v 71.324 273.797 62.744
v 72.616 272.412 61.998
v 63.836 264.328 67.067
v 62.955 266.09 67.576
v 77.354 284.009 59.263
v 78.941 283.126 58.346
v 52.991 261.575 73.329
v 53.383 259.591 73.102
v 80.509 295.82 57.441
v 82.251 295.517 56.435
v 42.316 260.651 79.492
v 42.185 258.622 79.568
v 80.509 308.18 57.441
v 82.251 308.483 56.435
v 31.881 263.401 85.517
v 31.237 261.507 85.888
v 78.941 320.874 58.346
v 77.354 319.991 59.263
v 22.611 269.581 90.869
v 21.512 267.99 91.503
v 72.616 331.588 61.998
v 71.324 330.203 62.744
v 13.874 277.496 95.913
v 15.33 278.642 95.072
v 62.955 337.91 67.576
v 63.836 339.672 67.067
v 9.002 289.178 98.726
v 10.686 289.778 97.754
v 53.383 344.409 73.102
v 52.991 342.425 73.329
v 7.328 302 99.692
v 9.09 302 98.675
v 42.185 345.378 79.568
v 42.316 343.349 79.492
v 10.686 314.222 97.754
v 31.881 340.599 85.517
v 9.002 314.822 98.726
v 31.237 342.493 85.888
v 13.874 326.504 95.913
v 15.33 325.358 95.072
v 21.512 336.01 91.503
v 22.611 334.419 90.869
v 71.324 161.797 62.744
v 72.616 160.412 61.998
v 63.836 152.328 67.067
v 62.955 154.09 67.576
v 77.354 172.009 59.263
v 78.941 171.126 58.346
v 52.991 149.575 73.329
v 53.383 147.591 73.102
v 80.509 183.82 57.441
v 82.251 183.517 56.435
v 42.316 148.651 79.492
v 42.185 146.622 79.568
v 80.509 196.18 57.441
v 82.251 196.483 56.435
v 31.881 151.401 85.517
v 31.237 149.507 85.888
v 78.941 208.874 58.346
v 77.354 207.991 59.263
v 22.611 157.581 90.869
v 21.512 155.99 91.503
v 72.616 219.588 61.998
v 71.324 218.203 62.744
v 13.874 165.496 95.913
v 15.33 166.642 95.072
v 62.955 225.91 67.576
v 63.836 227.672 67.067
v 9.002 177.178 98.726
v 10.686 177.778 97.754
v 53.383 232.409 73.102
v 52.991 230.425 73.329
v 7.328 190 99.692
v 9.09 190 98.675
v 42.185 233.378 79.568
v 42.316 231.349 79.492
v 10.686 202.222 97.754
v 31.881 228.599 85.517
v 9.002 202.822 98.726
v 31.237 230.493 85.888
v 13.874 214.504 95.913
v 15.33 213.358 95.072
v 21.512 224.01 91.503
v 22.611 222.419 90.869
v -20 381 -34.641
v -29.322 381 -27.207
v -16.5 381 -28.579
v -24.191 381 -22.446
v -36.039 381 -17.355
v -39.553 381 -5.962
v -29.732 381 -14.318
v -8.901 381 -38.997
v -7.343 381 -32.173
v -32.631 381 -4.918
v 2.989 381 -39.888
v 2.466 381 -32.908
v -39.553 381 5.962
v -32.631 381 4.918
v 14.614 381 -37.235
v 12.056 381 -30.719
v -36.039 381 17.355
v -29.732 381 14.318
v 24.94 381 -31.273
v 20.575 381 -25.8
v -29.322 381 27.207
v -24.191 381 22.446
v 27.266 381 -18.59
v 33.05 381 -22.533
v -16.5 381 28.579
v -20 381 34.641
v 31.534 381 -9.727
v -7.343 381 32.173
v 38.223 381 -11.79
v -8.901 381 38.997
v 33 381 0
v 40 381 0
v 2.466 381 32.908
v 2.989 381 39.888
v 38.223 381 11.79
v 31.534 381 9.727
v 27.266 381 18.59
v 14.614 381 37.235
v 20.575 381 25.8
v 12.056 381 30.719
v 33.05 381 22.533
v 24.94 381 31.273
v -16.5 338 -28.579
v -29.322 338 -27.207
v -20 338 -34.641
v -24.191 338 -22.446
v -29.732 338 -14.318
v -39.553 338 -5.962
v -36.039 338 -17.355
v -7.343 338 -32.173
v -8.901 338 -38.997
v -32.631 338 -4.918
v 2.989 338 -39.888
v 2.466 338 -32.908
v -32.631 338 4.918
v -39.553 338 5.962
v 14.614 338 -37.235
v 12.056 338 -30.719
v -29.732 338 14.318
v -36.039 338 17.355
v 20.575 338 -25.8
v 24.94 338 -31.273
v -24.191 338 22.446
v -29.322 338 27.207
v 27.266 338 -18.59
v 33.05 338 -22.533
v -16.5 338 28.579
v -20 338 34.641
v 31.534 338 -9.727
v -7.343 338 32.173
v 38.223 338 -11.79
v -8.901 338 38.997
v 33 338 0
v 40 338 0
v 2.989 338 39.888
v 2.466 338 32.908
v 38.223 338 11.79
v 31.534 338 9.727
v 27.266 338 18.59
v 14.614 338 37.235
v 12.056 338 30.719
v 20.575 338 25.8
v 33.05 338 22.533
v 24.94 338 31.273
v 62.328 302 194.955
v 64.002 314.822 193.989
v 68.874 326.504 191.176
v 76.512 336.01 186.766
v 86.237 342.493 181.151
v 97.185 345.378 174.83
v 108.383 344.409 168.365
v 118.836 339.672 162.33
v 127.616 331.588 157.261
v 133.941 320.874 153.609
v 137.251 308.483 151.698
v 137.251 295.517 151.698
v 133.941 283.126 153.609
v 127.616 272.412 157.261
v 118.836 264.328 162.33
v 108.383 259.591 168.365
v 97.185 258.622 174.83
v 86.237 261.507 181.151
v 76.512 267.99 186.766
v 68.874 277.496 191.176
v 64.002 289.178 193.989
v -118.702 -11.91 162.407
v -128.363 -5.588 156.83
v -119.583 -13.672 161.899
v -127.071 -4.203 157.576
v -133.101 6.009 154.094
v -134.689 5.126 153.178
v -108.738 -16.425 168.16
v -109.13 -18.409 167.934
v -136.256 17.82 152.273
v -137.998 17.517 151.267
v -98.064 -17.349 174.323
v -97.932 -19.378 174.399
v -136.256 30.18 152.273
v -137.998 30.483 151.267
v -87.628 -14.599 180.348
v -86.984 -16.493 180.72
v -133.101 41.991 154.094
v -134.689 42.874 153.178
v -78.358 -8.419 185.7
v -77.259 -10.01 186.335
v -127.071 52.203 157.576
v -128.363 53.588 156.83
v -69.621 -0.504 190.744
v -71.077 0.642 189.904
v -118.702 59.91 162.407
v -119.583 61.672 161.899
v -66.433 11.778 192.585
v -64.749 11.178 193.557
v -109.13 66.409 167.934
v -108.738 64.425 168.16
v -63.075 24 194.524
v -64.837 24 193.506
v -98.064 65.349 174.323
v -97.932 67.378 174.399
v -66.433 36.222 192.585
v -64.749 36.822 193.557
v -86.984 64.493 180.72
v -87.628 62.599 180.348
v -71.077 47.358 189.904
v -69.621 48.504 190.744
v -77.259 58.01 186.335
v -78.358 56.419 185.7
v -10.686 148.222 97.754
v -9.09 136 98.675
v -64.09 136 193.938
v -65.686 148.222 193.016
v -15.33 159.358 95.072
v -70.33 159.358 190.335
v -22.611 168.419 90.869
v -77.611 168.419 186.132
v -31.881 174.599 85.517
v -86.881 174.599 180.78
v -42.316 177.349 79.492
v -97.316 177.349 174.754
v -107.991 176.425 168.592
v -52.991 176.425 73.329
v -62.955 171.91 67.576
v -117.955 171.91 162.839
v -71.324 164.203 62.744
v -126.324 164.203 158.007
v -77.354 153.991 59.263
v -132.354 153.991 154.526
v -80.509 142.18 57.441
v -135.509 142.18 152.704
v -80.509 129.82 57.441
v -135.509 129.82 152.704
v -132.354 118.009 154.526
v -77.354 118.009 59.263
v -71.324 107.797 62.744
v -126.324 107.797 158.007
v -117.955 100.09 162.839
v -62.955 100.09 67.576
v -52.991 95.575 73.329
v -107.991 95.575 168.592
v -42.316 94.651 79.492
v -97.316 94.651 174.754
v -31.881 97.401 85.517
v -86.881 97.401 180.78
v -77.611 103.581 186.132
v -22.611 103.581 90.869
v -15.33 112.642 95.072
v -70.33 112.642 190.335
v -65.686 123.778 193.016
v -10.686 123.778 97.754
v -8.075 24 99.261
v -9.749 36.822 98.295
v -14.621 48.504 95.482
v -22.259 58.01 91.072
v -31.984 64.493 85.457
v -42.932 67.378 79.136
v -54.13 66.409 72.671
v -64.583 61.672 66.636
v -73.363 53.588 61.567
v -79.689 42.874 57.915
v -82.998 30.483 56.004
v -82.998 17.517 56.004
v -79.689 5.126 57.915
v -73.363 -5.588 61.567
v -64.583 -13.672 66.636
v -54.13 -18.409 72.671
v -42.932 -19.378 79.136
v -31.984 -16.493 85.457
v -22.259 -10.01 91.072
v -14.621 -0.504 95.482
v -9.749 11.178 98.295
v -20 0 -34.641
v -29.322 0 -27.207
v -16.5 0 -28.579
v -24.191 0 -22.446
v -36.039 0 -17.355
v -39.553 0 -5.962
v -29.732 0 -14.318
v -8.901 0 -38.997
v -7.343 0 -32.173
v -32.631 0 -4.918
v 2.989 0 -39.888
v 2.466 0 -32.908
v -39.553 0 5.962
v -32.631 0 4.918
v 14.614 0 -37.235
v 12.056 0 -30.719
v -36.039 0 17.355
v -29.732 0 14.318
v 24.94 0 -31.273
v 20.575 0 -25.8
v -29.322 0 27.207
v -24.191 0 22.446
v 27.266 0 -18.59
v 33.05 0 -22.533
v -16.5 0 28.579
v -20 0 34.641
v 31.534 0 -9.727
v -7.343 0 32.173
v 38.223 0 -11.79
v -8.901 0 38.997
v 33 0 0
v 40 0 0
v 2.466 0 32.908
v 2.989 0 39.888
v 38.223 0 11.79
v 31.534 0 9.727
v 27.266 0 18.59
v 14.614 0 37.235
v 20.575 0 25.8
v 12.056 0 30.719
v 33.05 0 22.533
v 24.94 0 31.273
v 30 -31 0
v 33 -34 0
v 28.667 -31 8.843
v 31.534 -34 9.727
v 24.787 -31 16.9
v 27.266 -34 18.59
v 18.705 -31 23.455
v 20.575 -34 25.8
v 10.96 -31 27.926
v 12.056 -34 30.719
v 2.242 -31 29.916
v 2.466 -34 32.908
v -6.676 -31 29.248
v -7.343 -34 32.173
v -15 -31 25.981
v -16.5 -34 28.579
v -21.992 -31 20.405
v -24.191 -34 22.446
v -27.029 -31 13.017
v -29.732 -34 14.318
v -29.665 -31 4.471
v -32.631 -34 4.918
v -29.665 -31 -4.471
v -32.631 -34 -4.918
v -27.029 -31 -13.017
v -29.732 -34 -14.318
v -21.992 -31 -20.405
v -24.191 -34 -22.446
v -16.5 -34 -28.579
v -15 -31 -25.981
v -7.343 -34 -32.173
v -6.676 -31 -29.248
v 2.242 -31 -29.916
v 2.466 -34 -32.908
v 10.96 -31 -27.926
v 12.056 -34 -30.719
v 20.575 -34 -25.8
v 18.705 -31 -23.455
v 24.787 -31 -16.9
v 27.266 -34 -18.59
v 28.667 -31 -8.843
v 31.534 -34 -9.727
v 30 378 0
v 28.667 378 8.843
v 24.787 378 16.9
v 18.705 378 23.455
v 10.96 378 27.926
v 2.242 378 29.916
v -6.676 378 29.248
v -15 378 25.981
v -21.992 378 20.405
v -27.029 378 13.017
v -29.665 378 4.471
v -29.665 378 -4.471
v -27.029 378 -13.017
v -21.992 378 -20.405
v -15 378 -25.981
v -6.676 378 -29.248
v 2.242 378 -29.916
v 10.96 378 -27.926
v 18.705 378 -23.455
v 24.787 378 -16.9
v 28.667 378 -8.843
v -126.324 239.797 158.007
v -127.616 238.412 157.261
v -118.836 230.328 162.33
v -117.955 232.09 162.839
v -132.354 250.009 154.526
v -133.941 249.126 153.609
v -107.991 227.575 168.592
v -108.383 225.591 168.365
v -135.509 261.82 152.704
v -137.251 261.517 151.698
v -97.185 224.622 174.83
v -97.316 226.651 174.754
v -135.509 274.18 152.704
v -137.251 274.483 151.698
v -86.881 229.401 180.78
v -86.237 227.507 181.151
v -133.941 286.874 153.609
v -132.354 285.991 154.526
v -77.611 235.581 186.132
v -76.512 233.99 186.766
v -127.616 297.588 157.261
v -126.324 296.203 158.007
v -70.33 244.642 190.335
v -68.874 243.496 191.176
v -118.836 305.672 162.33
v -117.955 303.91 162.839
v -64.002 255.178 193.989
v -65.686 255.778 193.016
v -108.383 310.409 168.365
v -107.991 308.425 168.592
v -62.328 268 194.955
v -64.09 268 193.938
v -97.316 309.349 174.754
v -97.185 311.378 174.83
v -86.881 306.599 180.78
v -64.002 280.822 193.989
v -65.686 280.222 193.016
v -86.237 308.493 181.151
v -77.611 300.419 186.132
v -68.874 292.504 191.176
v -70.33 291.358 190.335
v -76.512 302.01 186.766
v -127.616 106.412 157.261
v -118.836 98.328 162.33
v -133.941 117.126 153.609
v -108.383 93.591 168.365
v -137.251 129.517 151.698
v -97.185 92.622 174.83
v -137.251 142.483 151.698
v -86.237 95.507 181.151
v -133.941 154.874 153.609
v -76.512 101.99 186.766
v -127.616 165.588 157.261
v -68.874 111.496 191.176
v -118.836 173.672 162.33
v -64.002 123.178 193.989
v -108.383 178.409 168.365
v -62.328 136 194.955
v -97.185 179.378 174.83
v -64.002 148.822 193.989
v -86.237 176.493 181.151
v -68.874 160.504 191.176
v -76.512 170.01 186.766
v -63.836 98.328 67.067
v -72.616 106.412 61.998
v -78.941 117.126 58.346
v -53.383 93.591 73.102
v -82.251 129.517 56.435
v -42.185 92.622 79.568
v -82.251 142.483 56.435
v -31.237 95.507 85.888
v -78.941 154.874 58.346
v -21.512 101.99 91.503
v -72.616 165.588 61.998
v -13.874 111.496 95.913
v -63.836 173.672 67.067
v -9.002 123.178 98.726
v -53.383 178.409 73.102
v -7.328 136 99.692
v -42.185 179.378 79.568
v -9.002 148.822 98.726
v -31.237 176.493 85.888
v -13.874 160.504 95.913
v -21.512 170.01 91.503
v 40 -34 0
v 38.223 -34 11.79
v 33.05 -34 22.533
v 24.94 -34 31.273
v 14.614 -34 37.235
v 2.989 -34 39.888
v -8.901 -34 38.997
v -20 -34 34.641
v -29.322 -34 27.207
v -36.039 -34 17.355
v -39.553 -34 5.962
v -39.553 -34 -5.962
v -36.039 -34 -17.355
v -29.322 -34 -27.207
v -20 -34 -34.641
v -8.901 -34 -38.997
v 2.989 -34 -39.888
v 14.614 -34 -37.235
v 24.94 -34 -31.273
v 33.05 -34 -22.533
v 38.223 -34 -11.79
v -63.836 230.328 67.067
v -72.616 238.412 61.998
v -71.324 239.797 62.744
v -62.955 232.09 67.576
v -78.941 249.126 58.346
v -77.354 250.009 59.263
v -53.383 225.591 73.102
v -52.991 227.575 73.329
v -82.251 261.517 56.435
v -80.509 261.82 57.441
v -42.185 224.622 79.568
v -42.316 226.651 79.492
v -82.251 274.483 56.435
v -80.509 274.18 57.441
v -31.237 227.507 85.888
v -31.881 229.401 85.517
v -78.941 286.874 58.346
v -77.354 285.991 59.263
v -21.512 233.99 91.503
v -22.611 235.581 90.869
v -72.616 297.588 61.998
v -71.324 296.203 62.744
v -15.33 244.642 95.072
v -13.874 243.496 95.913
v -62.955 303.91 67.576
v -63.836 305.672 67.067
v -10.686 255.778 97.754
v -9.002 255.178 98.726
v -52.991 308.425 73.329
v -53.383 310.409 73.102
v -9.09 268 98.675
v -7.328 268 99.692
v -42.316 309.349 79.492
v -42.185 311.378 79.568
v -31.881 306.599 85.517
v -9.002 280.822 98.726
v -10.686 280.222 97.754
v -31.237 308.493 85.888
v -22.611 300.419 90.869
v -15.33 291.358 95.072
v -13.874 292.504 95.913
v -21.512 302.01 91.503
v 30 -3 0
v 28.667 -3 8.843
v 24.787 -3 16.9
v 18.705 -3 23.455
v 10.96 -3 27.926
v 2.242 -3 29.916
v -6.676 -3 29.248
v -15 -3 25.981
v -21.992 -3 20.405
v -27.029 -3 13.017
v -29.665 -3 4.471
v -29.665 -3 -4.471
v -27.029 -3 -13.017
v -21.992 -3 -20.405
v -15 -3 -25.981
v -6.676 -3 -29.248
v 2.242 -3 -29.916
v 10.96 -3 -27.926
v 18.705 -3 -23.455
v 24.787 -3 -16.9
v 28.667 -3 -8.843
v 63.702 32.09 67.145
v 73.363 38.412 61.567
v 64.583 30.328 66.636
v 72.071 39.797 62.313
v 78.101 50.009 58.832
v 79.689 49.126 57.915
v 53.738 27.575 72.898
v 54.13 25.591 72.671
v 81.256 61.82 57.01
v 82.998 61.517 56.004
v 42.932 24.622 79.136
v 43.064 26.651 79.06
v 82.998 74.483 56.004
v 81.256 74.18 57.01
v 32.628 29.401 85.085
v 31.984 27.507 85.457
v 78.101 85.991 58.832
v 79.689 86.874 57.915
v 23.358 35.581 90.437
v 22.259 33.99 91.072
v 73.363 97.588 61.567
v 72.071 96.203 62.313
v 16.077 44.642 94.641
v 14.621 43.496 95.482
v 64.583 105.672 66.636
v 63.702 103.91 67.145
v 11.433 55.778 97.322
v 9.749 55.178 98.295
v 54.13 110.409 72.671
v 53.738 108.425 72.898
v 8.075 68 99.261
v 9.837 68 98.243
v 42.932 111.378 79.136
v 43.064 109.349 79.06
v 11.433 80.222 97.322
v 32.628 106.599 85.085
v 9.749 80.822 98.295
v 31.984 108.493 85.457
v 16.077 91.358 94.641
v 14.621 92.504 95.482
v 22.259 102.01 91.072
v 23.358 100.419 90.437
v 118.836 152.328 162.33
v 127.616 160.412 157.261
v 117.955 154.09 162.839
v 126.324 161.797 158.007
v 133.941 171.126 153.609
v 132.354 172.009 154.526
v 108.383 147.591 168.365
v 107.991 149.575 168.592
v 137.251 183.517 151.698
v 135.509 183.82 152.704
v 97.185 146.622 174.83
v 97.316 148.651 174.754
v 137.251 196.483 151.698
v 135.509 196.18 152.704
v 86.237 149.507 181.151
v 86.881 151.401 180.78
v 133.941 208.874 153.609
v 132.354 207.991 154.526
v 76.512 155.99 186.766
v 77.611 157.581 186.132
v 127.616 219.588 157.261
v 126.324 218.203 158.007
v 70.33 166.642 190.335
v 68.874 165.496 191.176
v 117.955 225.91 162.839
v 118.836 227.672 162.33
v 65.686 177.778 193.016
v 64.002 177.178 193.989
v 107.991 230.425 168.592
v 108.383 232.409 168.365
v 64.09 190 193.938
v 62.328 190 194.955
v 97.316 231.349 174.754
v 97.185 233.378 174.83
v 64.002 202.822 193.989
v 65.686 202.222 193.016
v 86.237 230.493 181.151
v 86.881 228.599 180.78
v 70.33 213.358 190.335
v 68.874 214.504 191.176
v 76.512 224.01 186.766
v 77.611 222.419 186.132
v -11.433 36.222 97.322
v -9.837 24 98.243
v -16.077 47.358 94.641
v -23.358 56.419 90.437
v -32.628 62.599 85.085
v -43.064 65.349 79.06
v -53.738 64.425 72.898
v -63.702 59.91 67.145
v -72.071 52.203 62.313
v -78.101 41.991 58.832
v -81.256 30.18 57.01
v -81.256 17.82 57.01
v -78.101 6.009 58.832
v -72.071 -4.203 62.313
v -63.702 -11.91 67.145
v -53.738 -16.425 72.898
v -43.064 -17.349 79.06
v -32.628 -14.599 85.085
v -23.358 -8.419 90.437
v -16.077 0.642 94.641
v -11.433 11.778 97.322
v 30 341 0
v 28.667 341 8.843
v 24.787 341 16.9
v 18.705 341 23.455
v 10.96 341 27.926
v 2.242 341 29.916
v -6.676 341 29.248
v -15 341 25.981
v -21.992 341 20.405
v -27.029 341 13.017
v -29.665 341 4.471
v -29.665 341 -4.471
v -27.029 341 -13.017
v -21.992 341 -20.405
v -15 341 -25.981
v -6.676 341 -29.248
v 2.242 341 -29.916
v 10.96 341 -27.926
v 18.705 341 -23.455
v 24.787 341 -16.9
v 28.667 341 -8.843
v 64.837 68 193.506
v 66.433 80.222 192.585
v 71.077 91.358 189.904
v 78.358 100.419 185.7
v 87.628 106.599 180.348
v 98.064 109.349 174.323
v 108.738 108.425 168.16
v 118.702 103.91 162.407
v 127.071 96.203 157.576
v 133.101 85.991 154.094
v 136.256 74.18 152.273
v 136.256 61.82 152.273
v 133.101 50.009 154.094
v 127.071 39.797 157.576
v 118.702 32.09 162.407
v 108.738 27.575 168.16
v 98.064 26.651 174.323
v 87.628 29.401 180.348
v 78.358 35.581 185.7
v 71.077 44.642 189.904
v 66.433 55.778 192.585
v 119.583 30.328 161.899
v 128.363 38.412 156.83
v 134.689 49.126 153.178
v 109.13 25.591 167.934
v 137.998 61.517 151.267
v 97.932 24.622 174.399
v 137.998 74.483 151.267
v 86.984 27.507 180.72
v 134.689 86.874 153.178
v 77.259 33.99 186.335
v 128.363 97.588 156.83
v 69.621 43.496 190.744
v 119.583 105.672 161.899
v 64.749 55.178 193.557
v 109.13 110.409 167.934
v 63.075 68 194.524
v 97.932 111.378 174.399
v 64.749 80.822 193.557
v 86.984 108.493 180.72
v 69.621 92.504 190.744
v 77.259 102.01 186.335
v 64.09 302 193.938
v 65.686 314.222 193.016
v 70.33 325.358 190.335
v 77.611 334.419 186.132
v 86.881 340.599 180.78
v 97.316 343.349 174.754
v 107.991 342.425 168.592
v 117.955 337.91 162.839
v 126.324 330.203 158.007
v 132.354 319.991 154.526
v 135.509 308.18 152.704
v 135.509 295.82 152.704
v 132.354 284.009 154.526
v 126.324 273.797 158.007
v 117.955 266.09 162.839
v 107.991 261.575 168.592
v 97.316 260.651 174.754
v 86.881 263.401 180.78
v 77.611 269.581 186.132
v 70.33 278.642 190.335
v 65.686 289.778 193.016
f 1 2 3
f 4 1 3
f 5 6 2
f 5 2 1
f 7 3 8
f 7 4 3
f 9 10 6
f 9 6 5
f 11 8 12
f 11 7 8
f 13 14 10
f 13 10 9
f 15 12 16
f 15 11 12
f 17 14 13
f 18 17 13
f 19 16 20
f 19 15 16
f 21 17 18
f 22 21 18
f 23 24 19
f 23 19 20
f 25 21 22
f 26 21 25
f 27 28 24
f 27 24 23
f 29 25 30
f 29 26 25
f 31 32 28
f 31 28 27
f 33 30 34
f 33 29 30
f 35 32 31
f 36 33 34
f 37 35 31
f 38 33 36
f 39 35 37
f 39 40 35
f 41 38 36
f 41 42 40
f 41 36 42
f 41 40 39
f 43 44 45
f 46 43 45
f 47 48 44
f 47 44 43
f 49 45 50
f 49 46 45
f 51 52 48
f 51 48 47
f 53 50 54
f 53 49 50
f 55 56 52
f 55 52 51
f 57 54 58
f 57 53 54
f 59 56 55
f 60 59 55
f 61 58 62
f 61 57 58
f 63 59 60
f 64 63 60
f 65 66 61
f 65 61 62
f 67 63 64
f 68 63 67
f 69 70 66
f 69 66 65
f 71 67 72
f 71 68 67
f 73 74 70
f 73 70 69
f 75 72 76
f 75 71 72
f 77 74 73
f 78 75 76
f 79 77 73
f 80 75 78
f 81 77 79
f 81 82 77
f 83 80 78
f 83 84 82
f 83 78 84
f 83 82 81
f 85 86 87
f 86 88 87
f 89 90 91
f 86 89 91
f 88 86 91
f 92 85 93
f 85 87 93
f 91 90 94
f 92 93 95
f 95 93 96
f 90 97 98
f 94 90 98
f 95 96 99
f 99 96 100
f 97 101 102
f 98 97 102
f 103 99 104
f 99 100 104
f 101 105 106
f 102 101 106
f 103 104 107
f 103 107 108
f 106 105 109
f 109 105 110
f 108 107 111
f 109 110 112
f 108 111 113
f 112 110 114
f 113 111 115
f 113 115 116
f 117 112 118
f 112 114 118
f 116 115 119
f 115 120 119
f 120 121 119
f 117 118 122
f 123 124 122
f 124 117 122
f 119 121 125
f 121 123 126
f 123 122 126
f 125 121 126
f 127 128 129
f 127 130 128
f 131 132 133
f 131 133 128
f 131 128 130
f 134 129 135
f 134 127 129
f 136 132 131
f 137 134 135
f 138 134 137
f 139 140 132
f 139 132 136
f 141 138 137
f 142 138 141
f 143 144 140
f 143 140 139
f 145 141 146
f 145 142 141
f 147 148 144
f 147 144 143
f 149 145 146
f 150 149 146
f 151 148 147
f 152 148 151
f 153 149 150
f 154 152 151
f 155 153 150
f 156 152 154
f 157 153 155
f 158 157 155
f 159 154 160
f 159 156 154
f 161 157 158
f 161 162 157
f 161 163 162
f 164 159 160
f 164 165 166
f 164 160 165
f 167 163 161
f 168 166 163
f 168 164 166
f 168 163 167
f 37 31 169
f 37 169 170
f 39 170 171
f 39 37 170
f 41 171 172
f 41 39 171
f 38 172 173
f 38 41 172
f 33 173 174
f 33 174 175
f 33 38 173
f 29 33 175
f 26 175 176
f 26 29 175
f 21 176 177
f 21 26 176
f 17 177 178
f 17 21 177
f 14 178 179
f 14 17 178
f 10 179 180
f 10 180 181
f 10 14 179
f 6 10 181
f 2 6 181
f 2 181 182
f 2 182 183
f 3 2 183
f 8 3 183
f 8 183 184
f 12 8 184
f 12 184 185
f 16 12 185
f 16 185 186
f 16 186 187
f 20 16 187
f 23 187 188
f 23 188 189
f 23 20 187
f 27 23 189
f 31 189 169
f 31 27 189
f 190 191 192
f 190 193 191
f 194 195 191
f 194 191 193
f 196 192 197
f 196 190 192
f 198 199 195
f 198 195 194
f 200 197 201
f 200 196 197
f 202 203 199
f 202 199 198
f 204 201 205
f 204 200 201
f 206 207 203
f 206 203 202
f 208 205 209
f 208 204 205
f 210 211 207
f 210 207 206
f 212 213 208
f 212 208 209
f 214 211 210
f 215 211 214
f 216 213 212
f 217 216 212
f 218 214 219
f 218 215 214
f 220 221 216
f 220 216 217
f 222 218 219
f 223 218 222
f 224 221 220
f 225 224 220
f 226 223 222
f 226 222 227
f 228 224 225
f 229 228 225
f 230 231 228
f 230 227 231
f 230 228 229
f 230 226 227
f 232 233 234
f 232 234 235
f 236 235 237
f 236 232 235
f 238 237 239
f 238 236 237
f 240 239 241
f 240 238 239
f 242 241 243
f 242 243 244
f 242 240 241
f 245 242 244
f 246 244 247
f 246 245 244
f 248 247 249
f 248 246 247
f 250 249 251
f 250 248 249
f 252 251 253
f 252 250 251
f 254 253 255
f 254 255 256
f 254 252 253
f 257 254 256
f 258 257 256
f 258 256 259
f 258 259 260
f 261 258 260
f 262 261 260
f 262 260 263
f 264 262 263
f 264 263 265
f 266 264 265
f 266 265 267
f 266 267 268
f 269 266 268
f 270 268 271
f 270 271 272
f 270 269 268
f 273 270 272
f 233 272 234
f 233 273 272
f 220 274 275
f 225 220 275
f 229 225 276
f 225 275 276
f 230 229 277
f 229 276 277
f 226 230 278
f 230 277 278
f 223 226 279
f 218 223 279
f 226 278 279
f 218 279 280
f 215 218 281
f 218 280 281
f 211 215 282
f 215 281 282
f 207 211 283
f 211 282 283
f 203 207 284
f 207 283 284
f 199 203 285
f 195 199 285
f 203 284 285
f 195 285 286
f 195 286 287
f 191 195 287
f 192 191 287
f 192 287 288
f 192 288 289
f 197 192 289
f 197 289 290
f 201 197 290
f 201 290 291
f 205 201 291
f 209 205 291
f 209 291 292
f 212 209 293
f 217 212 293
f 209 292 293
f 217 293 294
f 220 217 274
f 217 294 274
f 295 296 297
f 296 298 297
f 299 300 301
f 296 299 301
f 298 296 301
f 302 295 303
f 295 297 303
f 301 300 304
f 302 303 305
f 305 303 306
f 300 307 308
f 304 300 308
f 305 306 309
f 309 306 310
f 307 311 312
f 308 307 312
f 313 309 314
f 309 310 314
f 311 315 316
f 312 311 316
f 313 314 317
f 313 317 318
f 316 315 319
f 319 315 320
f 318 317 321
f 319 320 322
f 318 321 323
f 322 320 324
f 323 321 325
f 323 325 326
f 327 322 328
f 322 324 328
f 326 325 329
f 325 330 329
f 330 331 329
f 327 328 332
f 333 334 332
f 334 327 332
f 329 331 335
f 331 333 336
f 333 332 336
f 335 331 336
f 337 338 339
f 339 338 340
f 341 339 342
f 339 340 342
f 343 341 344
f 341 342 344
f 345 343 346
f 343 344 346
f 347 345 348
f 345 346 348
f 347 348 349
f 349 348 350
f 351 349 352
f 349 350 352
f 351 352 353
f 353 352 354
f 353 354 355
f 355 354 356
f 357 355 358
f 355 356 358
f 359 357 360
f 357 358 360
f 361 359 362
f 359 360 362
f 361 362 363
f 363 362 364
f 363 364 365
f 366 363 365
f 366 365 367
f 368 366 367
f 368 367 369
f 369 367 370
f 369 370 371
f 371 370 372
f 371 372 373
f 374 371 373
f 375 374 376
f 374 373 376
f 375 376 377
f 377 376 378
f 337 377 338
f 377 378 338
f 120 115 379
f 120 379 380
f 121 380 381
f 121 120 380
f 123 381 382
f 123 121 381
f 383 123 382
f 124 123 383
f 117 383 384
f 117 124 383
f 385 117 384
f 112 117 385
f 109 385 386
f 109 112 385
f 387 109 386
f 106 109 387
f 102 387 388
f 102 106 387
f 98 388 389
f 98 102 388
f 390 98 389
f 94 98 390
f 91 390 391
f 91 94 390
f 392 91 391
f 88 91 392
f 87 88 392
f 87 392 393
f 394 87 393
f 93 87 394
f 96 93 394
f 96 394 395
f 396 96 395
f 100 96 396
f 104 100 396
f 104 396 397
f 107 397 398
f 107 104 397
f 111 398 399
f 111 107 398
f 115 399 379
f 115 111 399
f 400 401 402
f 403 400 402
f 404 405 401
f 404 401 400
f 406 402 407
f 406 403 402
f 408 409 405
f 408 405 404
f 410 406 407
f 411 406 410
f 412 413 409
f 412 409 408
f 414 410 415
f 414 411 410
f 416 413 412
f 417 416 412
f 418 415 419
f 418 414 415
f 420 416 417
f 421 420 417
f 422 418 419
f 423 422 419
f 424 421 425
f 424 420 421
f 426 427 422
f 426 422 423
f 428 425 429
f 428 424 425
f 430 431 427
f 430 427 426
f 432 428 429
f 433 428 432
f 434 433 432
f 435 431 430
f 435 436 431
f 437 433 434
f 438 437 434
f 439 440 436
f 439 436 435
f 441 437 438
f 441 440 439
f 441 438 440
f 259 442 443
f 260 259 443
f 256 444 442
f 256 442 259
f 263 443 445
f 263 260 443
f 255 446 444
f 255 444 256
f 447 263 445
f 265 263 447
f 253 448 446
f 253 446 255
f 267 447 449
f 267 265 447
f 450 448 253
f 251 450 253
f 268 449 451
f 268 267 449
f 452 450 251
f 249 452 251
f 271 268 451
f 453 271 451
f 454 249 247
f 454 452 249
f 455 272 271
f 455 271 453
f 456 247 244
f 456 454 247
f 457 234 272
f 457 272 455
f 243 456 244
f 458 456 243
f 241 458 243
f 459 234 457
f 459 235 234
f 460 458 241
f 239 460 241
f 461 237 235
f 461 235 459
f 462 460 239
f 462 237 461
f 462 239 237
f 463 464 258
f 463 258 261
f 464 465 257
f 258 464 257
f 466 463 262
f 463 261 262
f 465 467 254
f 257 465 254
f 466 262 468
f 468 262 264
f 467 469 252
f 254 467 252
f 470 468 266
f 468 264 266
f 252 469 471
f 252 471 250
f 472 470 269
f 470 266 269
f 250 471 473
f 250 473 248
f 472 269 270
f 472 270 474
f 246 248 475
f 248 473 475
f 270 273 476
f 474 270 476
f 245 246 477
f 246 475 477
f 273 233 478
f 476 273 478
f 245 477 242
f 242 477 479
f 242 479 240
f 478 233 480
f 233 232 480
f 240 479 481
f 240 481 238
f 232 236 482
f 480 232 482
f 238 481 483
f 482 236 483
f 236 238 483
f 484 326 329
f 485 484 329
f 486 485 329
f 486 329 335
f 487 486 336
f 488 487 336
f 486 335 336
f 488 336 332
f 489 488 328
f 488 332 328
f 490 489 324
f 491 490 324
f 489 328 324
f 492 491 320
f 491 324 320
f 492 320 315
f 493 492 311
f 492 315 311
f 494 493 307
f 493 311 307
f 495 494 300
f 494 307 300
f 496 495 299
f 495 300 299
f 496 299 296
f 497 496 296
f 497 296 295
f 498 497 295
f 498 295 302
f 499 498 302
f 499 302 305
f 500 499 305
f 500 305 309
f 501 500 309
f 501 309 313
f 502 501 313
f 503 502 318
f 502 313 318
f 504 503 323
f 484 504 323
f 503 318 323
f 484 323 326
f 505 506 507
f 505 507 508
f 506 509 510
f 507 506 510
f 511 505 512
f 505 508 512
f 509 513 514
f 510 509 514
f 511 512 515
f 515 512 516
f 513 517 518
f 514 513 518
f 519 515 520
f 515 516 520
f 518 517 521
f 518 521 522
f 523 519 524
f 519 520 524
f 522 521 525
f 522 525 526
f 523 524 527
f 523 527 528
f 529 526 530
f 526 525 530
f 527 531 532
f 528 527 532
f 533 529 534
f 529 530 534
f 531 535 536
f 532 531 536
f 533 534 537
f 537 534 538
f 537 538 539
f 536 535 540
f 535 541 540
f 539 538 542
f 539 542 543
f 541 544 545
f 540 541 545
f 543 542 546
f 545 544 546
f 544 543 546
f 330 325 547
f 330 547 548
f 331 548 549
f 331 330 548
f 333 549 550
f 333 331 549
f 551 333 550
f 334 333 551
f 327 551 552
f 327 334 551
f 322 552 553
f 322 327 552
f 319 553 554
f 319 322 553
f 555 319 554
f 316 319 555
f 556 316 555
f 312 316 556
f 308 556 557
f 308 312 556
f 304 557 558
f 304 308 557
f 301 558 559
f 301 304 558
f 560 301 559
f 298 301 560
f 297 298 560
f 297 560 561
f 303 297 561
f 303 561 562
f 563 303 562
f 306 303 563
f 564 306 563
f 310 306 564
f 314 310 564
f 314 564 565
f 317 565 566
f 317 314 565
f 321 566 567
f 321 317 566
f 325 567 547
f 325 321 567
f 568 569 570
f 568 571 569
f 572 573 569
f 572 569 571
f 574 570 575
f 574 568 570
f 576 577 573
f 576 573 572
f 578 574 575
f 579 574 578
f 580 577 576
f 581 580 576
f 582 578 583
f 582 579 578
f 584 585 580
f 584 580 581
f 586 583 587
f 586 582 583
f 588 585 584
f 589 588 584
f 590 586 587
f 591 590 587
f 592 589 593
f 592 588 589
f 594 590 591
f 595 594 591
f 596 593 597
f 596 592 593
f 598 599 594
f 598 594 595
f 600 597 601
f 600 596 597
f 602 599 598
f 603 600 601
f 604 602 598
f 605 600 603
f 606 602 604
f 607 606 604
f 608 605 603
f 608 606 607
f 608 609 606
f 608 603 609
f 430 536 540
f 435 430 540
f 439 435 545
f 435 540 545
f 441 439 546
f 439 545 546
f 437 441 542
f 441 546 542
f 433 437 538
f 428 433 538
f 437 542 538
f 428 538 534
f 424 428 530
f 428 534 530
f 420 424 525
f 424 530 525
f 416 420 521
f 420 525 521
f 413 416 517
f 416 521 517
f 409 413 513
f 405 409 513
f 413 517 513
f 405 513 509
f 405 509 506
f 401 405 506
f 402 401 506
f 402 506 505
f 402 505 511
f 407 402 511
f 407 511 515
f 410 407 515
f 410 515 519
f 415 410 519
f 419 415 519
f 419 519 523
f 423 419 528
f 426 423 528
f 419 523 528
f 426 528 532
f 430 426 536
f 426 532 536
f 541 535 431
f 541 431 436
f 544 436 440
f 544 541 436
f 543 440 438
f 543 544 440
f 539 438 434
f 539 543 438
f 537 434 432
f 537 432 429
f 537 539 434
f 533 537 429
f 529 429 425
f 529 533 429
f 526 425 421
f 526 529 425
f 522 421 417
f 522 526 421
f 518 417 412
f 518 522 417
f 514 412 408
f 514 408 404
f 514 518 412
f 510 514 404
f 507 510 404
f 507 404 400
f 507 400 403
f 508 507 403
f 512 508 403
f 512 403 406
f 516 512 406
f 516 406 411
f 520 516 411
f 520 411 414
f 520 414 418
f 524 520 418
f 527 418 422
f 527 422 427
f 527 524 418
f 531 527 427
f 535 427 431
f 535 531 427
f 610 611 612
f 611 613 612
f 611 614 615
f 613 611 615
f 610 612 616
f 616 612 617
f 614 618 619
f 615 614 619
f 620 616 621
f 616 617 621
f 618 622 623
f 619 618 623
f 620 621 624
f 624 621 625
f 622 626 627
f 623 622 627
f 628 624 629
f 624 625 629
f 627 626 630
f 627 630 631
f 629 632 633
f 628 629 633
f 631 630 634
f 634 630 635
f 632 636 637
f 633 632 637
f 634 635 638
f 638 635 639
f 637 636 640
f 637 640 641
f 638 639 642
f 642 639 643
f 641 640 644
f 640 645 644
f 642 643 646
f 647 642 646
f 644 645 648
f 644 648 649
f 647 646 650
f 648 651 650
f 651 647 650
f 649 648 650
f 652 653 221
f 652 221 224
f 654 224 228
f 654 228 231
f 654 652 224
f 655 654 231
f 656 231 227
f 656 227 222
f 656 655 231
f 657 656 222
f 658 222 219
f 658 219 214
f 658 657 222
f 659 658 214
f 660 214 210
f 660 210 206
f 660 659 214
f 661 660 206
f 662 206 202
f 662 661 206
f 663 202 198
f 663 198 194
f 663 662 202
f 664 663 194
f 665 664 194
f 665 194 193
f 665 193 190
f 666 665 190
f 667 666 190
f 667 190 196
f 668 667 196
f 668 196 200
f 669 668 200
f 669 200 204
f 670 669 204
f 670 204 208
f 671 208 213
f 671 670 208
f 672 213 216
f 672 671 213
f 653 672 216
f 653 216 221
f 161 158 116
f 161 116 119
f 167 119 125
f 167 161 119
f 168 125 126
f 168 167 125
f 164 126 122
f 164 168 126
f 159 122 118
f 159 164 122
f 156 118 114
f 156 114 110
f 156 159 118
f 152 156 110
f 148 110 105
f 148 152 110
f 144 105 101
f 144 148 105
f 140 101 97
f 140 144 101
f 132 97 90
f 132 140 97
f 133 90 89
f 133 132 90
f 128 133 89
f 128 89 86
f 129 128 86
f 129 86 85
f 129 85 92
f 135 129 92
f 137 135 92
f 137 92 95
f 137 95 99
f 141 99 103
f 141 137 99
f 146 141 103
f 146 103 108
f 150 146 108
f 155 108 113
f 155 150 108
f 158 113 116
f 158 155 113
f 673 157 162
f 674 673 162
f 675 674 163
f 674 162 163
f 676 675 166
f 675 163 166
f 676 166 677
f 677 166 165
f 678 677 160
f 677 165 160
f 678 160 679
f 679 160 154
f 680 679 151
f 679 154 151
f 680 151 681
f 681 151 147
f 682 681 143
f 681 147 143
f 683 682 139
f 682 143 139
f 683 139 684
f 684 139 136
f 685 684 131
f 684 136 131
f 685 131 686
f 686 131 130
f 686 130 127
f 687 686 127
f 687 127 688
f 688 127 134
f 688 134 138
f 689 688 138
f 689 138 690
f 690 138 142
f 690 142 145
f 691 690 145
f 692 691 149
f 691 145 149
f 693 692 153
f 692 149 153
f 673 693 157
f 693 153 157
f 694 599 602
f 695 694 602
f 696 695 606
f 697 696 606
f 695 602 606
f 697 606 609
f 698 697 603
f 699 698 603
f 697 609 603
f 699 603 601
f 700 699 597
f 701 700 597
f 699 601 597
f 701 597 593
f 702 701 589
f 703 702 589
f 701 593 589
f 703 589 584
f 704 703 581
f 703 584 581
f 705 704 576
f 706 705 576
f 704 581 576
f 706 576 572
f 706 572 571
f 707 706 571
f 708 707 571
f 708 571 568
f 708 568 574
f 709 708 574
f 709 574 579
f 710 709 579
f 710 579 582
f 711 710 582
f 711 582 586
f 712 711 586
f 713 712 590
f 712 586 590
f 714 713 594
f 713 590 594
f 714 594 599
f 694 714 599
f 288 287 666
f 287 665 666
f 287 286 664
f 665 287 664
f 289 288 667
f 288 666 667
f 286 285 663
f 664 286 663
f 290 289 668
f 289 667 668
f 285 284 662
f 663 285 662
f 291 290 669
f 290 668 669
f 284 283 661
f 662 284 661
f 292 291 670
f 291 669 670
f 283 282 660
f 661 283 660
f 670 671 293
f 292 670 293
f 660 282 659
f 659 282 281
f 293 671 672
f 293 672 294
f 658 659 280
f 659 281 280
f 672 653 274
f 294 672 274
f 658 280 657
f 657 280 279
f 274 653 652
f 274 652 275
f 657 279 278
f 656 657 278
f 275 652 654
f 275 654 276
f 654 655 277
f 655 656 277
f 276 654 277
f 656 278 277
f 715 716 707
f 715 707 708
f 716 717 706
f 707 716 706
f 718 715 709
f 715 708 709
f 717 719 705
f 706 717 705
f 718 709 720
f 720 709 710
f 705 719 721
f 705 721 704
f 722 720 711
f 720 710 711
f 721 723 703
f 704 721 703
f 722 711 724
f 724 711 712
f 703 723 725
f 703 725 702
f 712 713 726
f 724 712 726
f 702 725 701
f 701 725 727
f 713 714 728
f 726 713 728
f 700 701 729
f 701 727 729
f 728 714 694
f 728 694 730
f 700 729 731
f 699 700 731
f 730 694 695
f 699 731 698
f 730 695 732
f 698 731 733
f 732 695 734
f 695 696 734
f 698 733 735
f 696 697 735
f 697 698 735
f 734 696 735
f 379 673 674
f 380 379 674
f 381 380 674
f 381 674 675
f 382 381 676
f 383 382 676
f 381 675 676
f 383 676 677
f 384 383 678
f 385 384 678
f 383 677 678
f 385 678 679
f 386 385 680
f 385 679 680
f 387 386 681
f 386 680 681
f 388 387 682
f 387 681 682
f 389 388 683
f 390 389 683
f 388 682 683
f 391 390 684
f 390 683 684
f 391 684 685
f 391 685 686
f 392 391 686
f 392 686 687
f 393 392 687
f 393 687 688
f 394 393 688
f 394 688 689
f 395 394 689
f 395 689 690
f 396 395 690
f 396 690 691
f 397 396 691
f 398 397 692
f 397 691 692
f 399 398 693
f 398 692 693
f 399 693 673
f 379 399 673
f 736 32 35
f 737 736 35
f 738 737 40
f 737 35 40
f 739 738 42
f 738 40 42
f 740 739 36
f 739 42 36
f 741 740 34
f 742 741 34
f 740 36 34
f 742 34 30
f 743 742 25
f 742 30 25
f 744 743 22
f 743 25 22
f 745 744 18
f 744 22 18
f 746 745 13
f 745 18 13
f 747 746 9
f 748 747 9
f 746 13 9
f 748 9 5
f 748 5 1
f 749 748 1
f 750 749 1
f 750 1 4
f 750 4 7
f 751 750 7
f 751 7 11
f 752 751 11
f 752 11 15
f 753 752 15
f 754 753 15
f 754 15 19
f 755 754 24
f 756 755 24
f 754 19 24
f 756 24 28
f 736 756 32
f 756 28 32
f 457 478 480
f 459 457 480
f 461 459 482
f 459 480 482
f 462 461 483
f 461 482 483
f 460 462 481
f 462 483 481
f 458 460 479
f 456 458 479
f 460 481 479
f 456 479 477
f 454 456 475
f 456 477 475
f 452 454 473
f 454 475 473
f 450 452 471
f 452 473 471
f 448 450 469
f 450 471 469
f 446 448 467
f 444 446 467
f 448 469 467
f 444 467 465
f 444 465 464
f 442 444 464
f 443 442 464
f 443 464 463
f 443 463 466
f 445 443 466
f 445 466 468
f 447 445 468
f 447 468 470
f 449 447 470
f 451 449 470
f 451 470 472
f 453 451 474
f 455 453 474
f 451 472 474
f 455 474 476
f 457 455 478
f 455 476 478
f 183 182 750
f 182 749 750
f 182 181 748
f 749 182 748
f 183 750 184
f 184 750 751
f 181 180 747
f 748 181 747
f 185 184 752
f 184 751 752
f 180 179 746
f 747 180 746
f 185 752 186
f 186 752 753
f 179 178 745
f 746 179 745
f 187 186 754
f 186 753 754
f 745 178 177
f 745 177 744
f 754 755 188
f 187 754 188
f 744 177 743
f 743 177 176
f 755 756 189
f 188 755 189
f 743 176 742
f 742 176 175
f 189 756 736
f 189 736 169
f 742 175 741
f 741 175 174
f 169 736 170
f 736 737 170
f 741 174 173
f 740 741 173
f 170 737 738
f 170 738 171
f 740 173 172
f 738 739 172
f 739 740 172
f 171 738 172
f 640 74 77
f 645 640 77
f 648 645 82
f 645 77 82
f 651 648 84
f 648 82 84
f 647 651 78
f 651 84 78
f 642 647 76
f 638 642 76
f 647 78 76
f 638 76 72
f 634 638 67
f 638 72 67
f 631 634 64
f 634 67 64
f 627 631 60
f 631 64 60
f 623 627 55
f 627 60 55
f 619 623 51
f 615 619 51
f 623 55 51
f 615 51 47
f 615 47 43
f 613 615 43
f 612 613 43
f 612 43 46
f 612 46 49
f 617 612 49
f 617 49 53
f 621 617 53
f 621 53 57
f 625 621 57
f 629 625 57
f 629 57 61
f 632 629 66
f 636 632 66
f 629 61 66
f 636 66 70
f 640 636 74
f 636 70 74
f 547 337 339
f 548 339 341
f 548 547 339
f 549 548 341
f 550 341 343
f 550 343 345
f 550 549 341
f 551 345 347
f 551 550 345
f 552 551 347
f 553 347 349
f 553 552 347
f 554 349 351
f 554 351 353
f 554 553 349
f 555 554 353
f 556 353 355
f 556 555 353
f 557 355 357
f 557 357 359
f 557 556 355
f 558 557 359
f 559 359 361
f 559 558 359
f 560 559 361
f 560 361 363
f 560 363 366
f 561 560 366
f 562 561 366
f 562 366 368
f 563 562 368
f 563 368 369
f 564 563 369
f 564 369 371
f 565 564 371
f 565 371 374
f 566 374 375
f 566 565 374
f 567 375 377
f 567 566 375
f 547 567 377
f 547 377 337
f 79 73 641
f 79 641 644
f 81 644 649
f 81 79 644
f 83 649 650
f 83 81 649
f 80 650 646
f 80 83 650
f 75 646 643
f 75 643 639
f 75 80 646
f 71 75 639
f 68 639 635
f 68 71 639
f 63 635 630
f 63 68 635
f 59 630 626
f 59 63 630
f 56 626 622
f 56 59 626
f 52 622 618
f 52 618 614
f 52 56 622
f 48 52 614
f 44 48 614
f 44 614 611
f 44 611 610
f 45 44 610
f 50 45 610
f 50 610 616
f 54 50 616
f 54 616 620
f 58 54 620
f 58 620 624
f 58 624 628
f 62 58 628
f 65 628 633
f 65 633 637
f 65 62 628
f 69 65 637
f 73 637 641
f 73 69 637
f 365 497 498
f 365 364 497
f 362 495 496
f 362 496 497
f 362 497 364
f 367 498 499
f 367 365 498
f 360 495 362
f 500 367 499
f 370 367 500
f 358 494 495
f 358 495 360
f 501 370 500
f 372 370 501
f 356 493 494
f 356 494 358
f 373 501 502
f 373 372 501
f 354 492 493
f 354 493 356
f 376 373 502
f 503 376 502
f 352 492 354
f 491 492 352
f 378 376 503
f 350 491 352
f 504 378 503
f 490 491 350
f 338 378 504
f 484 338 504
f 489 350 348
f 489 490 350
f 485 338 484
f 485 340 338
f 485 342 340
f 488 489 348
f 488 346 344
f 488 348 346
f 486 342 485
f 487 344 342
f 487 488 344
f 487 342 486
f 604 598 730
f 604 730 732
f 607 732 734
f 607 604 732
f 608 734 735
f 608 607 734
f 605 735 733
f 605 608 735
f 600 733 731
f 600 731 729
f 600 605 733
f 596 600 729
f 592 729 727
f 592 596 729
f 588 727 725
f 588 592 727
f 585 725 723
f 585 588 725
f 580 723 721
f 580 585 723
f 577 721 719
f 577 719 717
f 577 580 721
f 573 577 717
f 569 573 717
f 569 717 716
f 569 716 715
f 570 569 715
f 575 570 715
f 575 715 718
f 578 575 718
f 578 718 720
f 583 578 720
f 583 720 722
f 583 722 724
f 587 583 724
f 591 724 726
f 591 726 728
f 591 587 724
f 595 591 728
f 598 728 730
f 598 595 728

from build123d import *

# Parameters (mm, degrees)
F0_R      = 40
F0_R_2    = 30
F1_DEPTH  = 34
F3_R      = 40
F3_R_2    = 30
F4_DEPTH  = 43
F5_SIZE   = 3
F5_2_SIZE = 3
F8_START  = 90
F7_R      = 43.5
F7_R_2    = 41.465
F8_DEPTH  = 110


with BuildPart() as f1:
    # F0 (on Front) → F1 (new body)
    with BuildSketch(Plane.XZ):
        Circle(F0_R)
        Circle(F0_R_2, mode=Mode.SUBTRACT)
    extrude(amount=F1_DEPTH)

    # F5
    f5_edges = [f1.edges().sort_by_distance(p)[0] for p in [
        (-30, -34, 0),
        (-30, 0, 0),
    ]]
    chamfer(f5_edges, length=F5_SIZE)


with BuildPart() as f4:
    # F3 (on offset) → F4 (new body)
    with BuildSketch(Plane.XZ.offset(-338)):
        Circle(F3_R)
        Circle(F3_R_2, mode=Mode.SUBTRACT)
    extrude(amount=-F4_DEPTH)

    # F5#2
    f5_2_edges = [f4.edges().sort_by_distance(p)[0] for p in [
        (-30, 338, 0),
        (-30, 381, 0),
    ]]
    chamfer(f5_2_edges, length=F5_2_SIZE)


with BuildPart() as f8:
    # F7 (on face) → F8 (new body)
    with BuildSketch(Plane(origin=(0, 0, 0), x_dir=(0.8660254038, 0, 0.5), z_dir=(-0.5, 0, 0.8660254038)).offset(F8_START)):
        with Locations((-0.8627325296, 14)):
            Circle(F7_R)
        with Locations((-0.8627325296, 14)):
            Circle(F7_R_2, mode=Mode.SUBTRACT)
    extrude(amount=F8_DEPTH)


with BuildPart() as f8b:
    # F7 (on face) → F8, piece 2 (new body)
    with BuildSketch(Plane(origin=(0, 0, 0), x_dir=(0.8660254038, 0, 0.5), z_dir=(-0.5, 0, 0.8660254038)).offset(F8_START)):
        with Locations((0, 136)):
            Circle(F7_R)
        with Locations((0, 136)):
            Circle(F7_R_2, mode=Mode.SUBTRACT)
    extrude(amount=F8_DEPTH)


with BuildPart() as f8c:
    # F7 (on face) → F8, piece 3 (new body)
    with BuildSketch(Plane(origin=(0, 0, 0), x_dir=(0.8660254038, 0, 0.5), z_dir=(-0.5, 0, 0.8660254038)).offset(F8_START)):
        with Locations((0, 258)):
            Circle(F7_R)
        with Locations((0, 258)):
            Circle(F7_R_2, mode=Mode.SUBTRACT)
    extrude(amount=F8_DEPTH)


with BuildPart() as f9_1:
    # F9: instance of F8c
    add(f8c.part.mirror(Plane.YZ))


with BuildPart() as f9_2:
    # F9: instance of F8b
    add(f8b.part.mirror(Plane.YZ))


with BuildPart() as f9_3:
    # F9: instance of F8
    add(f8.part.mirror(Plane.YZ))


with BuildPart() as f9_3_1:
    # F10: moved
    add(f9_3.part.moved(Location((0, 44, 0))))


with BuildPart() as f9_2_1:
    # F10: moved
    add(f9_2.part.moved(Location((0, 44, 0))))


with BuildPart() as f9_1_1:
    # F10: moved
    add(f9_1.part.moved(Location((0, 44, 0))))


with BuildPart() as f8_1:
    # F11: moved
    add(f8.part.moved(Location((0, 10, 0))))


with BuildPart() as f9_3_2:
    # F11: moved
    add(f9_3_1.part.moved(Location((0, 10, 0))))


with BuildPart() as f9_2_2:
    # F11: moved
    add(f9_2_1.part.moved(Location((0, 10, 0))))


with BuildPart() as f8c_1:
    # F11: moved
    add(f8c.part.moved(Location((0, 10, 0))))


solid = Compound([f1.part, f4.part, f8b.part, f9_1_1.part, f8_1.part, f9_3_2.part, f9_2_2.part, f8c_1.part])
